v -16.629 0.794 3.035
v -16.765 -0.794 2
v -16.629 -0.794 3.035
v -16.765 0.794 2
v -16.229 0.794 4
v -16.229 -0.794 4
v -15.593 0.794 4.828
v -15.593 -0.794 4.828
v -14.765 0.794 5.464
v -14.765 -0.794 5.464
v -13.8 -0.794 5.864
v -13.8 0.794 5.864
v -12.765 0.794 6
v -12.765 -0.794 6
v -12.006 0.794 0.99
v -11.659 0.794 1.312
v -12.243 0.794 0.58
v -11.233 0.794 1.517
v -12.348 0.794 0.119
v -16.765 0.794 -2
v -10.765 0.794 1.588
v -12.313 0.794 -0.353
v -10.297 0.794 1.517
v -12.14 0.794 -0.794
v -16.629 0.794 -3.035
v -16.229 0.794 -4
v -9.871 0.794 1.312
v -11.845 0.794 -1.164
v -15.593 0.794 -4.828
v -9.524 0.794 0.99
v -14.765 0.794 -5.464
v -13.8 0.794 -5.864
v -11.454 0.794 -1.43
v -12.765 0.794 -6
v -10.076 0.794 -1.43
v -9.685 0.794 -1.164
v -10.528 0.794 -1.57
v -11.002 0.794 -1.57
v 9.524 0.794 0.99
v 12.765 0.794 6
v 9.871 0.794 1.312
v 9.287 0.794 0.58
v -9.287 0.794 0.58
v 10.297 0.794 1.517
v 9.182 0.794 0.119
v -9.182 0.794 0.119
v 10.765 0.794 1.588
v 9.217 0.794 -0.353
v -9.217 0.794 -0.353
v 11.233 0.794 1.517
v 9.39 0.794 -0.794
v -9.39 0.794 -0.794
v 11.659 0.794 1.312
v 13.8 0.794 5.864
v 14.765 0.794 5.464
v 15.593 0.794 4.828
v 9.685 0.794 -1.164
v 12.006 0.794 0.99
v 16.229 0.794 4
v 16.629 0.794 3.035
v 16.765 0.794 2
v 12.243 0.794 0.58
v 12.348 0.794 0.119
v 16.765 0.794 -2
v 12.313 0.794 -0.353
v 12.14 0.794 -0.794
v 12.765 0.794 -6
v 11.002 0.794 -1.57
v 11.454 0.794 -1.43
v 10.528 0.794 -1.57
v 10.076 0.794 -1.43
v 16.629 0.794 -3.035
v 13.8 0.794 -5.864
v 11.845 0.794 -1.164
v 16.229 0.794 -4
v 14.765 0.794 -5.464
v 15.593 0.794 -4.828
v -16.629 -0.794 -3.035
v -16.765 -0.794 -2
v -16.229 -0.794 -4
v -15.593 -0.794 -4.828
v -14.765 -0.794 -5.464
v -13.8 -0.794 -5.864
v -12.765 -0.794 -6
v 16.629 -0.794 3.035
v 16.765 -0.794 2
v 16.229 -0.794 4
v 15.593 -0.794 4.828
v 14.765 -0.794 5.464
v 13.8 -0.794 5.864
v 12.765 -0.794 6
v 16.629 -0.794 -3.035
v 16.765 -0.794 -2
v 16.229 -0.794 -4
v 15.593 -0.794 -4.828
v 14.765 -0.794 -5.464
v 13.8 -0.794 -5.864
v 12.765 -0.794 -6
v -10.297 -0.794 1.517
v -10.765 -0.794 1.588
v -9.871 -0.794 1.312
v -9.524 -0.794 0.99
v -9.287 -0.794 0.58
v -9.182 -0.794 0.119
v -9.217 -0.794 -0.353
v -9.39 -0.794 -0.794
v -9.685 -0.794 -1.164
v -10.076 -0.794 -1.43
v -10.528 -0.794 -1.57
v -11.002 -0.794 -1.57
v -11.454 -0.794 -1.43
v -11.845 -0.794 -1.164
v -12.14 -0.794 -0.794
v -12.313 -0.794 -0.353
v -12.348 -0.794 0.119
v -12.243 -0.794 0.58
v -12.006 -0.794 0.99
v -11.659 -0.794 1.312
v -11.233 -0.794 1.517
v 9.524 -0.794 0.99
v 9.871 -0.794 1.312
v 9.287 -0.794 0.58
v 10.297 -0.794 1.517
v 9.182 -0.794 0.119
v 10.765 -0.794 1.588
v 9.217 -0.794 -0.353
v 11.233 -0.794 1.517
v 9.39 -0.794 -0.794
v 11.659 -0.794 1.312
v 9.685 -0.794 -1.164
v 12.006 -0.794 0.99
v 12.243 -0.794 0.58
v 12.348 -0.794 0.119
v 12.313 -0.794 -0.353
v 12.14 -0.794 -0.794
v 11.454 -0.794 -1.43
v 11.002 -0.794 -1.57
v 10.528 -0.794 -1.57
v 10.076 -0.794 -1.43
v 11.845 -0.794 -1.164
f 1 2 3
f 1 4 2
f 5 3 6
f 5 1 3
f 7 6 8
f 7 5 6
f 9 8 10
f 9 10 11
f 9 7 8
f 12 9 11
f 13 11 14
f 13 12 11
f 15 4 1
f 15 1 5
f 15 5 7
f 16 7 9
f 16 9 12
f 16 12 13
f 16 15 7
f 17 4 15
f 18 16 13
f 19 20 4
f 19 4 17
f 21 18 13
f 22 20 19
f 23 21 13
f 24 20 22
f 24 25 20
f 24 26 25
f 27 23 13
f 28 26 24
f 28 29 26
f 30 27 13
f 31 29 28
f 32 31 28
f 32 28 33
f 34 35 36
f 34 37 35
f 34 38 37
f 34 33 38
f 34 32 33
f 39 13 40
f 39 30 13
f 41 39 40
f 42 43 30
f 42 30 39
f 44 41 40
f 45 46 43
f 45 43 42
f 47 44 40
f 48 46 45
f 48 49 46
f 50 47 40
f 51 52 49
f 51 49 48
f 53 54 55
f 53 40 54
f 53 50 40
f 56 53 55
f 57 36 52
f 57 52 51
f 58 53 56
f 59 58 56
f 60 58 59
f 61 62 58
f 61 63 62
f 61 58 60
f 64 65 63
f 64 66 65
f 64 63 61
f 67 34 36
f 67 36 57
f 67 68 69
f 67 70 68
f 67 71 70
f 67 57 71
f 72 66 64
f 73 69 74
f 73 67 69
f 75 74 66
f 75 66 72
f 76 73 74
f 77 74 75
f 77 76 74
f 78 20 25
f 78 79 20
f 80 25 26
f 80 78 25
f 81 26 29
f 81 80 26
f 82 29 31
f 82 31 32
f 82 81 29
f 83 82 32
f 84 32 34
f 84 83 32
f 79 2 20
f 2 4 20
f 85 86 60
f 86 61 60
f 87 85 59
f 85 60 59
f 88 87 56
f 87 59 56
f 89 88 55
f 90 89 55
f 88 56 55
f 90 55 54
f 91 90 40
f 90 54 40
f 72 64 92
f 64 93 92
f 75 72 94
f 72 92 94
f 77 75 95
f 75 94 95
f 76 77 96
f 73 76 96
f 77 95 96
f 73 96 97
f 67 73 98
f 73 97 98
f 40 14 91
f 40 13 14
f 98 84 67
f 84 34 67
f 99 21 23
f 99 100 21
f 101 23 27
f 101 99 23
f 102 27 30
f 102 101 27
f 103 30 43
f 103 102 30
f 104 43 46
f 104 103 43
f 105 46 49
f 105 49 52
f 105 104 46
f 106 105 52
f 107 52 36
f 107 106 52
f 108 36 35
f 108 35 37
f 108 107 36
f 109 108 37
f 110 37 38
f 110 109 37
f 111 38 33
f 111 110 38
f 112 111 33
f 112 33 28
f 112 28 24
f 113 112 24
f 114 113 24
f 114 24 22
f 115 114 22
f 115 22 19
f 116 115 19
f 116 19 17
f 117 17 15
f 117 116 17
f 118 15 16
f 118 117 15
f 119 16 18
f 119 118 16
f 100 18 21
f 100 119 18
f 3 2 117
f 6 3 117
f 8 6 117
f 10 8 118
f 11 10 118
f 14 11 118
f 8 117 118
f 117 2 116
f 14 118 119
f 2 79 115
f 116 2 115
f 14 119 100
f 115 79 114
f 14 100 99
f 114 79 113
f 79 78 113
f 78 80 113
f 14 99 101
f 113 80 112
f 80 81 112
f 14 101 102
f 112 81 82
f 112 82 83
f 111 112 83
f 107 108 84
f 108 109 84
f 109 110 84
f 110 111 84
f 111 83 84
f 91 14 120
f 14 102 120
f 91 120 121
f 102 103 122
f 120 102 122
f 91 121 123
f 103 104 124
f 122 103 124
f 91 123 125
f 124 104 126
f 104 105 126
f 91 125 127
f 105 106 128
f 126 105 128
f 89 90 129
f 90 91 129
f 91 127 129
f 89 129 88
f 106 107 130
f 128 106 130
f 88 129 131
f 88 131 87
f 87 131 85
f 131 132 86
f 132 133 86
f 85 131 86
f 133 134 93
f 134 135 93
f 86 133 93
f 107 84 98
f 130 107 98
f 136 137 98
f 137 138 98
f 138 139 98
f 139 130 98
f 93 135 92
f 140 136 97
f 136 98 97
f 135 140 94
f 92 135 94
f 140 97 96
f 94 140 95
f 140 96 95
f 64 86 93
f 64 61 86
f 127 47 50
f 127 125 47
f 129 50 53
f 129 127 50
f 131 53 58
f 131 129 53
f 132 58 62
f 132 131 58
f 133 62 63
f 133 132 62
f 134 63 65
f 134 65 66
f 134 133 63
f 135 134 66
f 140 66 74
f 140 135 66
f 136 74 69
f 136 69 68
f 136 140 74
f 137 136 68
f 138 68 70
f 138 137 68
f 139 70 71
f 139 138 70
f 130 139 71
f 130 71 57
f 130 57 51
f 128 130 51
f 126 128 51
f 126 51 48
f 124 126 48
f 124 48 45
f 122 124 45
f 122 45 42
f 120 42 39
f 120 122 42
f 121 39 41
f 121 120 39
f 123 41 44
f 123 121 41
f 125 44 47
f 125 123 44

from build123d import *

# Parameters (mm, degrees)
SKETCH1_W           = 33.53
SKETCH1_H           = 12
SKETCH1_R           = 1.5875
BOSS_EXTRUDE1_DEPTH = 0.79375
FILLET1_R           = 4


with BuildPart() as part:
    # Sketch1 → Boss-Extrude1 (new, symmetric)
    with BuildSketch(Plane(origin=(0, 0, 0), x_dir=(1, 0, 0), z_dir=(0, 1, 0))):
        Rectangle(SKETCH1_W, SKETCH1_H)
        with Locations(Location((-10.765, 0, 0), (0, 0, 270))):
            Circle(SKETCH1_R, mode=Mode.SUBTRACT)
        with Locations(Location((10.765, 0, 0), (0, 0, 270))):
            Circle(SKETCH1_R, mode=Mode.SUBTRACT)
    extrude(amount=BOSS_EXTRUDE1_DEPTH, both=True)

    # Fillet1
    fillet1_edges = [part.edges().sort_by_distance(p)[0] for p in [
        (-16.765, 0, -6),
        (16.765, 0, -6),
        (16.765, 0, 6),
        (-16.765, 0, 6),
    ]]
    fillet(fillet1_edges, radius=FILLET1_R)


solid = part.part
